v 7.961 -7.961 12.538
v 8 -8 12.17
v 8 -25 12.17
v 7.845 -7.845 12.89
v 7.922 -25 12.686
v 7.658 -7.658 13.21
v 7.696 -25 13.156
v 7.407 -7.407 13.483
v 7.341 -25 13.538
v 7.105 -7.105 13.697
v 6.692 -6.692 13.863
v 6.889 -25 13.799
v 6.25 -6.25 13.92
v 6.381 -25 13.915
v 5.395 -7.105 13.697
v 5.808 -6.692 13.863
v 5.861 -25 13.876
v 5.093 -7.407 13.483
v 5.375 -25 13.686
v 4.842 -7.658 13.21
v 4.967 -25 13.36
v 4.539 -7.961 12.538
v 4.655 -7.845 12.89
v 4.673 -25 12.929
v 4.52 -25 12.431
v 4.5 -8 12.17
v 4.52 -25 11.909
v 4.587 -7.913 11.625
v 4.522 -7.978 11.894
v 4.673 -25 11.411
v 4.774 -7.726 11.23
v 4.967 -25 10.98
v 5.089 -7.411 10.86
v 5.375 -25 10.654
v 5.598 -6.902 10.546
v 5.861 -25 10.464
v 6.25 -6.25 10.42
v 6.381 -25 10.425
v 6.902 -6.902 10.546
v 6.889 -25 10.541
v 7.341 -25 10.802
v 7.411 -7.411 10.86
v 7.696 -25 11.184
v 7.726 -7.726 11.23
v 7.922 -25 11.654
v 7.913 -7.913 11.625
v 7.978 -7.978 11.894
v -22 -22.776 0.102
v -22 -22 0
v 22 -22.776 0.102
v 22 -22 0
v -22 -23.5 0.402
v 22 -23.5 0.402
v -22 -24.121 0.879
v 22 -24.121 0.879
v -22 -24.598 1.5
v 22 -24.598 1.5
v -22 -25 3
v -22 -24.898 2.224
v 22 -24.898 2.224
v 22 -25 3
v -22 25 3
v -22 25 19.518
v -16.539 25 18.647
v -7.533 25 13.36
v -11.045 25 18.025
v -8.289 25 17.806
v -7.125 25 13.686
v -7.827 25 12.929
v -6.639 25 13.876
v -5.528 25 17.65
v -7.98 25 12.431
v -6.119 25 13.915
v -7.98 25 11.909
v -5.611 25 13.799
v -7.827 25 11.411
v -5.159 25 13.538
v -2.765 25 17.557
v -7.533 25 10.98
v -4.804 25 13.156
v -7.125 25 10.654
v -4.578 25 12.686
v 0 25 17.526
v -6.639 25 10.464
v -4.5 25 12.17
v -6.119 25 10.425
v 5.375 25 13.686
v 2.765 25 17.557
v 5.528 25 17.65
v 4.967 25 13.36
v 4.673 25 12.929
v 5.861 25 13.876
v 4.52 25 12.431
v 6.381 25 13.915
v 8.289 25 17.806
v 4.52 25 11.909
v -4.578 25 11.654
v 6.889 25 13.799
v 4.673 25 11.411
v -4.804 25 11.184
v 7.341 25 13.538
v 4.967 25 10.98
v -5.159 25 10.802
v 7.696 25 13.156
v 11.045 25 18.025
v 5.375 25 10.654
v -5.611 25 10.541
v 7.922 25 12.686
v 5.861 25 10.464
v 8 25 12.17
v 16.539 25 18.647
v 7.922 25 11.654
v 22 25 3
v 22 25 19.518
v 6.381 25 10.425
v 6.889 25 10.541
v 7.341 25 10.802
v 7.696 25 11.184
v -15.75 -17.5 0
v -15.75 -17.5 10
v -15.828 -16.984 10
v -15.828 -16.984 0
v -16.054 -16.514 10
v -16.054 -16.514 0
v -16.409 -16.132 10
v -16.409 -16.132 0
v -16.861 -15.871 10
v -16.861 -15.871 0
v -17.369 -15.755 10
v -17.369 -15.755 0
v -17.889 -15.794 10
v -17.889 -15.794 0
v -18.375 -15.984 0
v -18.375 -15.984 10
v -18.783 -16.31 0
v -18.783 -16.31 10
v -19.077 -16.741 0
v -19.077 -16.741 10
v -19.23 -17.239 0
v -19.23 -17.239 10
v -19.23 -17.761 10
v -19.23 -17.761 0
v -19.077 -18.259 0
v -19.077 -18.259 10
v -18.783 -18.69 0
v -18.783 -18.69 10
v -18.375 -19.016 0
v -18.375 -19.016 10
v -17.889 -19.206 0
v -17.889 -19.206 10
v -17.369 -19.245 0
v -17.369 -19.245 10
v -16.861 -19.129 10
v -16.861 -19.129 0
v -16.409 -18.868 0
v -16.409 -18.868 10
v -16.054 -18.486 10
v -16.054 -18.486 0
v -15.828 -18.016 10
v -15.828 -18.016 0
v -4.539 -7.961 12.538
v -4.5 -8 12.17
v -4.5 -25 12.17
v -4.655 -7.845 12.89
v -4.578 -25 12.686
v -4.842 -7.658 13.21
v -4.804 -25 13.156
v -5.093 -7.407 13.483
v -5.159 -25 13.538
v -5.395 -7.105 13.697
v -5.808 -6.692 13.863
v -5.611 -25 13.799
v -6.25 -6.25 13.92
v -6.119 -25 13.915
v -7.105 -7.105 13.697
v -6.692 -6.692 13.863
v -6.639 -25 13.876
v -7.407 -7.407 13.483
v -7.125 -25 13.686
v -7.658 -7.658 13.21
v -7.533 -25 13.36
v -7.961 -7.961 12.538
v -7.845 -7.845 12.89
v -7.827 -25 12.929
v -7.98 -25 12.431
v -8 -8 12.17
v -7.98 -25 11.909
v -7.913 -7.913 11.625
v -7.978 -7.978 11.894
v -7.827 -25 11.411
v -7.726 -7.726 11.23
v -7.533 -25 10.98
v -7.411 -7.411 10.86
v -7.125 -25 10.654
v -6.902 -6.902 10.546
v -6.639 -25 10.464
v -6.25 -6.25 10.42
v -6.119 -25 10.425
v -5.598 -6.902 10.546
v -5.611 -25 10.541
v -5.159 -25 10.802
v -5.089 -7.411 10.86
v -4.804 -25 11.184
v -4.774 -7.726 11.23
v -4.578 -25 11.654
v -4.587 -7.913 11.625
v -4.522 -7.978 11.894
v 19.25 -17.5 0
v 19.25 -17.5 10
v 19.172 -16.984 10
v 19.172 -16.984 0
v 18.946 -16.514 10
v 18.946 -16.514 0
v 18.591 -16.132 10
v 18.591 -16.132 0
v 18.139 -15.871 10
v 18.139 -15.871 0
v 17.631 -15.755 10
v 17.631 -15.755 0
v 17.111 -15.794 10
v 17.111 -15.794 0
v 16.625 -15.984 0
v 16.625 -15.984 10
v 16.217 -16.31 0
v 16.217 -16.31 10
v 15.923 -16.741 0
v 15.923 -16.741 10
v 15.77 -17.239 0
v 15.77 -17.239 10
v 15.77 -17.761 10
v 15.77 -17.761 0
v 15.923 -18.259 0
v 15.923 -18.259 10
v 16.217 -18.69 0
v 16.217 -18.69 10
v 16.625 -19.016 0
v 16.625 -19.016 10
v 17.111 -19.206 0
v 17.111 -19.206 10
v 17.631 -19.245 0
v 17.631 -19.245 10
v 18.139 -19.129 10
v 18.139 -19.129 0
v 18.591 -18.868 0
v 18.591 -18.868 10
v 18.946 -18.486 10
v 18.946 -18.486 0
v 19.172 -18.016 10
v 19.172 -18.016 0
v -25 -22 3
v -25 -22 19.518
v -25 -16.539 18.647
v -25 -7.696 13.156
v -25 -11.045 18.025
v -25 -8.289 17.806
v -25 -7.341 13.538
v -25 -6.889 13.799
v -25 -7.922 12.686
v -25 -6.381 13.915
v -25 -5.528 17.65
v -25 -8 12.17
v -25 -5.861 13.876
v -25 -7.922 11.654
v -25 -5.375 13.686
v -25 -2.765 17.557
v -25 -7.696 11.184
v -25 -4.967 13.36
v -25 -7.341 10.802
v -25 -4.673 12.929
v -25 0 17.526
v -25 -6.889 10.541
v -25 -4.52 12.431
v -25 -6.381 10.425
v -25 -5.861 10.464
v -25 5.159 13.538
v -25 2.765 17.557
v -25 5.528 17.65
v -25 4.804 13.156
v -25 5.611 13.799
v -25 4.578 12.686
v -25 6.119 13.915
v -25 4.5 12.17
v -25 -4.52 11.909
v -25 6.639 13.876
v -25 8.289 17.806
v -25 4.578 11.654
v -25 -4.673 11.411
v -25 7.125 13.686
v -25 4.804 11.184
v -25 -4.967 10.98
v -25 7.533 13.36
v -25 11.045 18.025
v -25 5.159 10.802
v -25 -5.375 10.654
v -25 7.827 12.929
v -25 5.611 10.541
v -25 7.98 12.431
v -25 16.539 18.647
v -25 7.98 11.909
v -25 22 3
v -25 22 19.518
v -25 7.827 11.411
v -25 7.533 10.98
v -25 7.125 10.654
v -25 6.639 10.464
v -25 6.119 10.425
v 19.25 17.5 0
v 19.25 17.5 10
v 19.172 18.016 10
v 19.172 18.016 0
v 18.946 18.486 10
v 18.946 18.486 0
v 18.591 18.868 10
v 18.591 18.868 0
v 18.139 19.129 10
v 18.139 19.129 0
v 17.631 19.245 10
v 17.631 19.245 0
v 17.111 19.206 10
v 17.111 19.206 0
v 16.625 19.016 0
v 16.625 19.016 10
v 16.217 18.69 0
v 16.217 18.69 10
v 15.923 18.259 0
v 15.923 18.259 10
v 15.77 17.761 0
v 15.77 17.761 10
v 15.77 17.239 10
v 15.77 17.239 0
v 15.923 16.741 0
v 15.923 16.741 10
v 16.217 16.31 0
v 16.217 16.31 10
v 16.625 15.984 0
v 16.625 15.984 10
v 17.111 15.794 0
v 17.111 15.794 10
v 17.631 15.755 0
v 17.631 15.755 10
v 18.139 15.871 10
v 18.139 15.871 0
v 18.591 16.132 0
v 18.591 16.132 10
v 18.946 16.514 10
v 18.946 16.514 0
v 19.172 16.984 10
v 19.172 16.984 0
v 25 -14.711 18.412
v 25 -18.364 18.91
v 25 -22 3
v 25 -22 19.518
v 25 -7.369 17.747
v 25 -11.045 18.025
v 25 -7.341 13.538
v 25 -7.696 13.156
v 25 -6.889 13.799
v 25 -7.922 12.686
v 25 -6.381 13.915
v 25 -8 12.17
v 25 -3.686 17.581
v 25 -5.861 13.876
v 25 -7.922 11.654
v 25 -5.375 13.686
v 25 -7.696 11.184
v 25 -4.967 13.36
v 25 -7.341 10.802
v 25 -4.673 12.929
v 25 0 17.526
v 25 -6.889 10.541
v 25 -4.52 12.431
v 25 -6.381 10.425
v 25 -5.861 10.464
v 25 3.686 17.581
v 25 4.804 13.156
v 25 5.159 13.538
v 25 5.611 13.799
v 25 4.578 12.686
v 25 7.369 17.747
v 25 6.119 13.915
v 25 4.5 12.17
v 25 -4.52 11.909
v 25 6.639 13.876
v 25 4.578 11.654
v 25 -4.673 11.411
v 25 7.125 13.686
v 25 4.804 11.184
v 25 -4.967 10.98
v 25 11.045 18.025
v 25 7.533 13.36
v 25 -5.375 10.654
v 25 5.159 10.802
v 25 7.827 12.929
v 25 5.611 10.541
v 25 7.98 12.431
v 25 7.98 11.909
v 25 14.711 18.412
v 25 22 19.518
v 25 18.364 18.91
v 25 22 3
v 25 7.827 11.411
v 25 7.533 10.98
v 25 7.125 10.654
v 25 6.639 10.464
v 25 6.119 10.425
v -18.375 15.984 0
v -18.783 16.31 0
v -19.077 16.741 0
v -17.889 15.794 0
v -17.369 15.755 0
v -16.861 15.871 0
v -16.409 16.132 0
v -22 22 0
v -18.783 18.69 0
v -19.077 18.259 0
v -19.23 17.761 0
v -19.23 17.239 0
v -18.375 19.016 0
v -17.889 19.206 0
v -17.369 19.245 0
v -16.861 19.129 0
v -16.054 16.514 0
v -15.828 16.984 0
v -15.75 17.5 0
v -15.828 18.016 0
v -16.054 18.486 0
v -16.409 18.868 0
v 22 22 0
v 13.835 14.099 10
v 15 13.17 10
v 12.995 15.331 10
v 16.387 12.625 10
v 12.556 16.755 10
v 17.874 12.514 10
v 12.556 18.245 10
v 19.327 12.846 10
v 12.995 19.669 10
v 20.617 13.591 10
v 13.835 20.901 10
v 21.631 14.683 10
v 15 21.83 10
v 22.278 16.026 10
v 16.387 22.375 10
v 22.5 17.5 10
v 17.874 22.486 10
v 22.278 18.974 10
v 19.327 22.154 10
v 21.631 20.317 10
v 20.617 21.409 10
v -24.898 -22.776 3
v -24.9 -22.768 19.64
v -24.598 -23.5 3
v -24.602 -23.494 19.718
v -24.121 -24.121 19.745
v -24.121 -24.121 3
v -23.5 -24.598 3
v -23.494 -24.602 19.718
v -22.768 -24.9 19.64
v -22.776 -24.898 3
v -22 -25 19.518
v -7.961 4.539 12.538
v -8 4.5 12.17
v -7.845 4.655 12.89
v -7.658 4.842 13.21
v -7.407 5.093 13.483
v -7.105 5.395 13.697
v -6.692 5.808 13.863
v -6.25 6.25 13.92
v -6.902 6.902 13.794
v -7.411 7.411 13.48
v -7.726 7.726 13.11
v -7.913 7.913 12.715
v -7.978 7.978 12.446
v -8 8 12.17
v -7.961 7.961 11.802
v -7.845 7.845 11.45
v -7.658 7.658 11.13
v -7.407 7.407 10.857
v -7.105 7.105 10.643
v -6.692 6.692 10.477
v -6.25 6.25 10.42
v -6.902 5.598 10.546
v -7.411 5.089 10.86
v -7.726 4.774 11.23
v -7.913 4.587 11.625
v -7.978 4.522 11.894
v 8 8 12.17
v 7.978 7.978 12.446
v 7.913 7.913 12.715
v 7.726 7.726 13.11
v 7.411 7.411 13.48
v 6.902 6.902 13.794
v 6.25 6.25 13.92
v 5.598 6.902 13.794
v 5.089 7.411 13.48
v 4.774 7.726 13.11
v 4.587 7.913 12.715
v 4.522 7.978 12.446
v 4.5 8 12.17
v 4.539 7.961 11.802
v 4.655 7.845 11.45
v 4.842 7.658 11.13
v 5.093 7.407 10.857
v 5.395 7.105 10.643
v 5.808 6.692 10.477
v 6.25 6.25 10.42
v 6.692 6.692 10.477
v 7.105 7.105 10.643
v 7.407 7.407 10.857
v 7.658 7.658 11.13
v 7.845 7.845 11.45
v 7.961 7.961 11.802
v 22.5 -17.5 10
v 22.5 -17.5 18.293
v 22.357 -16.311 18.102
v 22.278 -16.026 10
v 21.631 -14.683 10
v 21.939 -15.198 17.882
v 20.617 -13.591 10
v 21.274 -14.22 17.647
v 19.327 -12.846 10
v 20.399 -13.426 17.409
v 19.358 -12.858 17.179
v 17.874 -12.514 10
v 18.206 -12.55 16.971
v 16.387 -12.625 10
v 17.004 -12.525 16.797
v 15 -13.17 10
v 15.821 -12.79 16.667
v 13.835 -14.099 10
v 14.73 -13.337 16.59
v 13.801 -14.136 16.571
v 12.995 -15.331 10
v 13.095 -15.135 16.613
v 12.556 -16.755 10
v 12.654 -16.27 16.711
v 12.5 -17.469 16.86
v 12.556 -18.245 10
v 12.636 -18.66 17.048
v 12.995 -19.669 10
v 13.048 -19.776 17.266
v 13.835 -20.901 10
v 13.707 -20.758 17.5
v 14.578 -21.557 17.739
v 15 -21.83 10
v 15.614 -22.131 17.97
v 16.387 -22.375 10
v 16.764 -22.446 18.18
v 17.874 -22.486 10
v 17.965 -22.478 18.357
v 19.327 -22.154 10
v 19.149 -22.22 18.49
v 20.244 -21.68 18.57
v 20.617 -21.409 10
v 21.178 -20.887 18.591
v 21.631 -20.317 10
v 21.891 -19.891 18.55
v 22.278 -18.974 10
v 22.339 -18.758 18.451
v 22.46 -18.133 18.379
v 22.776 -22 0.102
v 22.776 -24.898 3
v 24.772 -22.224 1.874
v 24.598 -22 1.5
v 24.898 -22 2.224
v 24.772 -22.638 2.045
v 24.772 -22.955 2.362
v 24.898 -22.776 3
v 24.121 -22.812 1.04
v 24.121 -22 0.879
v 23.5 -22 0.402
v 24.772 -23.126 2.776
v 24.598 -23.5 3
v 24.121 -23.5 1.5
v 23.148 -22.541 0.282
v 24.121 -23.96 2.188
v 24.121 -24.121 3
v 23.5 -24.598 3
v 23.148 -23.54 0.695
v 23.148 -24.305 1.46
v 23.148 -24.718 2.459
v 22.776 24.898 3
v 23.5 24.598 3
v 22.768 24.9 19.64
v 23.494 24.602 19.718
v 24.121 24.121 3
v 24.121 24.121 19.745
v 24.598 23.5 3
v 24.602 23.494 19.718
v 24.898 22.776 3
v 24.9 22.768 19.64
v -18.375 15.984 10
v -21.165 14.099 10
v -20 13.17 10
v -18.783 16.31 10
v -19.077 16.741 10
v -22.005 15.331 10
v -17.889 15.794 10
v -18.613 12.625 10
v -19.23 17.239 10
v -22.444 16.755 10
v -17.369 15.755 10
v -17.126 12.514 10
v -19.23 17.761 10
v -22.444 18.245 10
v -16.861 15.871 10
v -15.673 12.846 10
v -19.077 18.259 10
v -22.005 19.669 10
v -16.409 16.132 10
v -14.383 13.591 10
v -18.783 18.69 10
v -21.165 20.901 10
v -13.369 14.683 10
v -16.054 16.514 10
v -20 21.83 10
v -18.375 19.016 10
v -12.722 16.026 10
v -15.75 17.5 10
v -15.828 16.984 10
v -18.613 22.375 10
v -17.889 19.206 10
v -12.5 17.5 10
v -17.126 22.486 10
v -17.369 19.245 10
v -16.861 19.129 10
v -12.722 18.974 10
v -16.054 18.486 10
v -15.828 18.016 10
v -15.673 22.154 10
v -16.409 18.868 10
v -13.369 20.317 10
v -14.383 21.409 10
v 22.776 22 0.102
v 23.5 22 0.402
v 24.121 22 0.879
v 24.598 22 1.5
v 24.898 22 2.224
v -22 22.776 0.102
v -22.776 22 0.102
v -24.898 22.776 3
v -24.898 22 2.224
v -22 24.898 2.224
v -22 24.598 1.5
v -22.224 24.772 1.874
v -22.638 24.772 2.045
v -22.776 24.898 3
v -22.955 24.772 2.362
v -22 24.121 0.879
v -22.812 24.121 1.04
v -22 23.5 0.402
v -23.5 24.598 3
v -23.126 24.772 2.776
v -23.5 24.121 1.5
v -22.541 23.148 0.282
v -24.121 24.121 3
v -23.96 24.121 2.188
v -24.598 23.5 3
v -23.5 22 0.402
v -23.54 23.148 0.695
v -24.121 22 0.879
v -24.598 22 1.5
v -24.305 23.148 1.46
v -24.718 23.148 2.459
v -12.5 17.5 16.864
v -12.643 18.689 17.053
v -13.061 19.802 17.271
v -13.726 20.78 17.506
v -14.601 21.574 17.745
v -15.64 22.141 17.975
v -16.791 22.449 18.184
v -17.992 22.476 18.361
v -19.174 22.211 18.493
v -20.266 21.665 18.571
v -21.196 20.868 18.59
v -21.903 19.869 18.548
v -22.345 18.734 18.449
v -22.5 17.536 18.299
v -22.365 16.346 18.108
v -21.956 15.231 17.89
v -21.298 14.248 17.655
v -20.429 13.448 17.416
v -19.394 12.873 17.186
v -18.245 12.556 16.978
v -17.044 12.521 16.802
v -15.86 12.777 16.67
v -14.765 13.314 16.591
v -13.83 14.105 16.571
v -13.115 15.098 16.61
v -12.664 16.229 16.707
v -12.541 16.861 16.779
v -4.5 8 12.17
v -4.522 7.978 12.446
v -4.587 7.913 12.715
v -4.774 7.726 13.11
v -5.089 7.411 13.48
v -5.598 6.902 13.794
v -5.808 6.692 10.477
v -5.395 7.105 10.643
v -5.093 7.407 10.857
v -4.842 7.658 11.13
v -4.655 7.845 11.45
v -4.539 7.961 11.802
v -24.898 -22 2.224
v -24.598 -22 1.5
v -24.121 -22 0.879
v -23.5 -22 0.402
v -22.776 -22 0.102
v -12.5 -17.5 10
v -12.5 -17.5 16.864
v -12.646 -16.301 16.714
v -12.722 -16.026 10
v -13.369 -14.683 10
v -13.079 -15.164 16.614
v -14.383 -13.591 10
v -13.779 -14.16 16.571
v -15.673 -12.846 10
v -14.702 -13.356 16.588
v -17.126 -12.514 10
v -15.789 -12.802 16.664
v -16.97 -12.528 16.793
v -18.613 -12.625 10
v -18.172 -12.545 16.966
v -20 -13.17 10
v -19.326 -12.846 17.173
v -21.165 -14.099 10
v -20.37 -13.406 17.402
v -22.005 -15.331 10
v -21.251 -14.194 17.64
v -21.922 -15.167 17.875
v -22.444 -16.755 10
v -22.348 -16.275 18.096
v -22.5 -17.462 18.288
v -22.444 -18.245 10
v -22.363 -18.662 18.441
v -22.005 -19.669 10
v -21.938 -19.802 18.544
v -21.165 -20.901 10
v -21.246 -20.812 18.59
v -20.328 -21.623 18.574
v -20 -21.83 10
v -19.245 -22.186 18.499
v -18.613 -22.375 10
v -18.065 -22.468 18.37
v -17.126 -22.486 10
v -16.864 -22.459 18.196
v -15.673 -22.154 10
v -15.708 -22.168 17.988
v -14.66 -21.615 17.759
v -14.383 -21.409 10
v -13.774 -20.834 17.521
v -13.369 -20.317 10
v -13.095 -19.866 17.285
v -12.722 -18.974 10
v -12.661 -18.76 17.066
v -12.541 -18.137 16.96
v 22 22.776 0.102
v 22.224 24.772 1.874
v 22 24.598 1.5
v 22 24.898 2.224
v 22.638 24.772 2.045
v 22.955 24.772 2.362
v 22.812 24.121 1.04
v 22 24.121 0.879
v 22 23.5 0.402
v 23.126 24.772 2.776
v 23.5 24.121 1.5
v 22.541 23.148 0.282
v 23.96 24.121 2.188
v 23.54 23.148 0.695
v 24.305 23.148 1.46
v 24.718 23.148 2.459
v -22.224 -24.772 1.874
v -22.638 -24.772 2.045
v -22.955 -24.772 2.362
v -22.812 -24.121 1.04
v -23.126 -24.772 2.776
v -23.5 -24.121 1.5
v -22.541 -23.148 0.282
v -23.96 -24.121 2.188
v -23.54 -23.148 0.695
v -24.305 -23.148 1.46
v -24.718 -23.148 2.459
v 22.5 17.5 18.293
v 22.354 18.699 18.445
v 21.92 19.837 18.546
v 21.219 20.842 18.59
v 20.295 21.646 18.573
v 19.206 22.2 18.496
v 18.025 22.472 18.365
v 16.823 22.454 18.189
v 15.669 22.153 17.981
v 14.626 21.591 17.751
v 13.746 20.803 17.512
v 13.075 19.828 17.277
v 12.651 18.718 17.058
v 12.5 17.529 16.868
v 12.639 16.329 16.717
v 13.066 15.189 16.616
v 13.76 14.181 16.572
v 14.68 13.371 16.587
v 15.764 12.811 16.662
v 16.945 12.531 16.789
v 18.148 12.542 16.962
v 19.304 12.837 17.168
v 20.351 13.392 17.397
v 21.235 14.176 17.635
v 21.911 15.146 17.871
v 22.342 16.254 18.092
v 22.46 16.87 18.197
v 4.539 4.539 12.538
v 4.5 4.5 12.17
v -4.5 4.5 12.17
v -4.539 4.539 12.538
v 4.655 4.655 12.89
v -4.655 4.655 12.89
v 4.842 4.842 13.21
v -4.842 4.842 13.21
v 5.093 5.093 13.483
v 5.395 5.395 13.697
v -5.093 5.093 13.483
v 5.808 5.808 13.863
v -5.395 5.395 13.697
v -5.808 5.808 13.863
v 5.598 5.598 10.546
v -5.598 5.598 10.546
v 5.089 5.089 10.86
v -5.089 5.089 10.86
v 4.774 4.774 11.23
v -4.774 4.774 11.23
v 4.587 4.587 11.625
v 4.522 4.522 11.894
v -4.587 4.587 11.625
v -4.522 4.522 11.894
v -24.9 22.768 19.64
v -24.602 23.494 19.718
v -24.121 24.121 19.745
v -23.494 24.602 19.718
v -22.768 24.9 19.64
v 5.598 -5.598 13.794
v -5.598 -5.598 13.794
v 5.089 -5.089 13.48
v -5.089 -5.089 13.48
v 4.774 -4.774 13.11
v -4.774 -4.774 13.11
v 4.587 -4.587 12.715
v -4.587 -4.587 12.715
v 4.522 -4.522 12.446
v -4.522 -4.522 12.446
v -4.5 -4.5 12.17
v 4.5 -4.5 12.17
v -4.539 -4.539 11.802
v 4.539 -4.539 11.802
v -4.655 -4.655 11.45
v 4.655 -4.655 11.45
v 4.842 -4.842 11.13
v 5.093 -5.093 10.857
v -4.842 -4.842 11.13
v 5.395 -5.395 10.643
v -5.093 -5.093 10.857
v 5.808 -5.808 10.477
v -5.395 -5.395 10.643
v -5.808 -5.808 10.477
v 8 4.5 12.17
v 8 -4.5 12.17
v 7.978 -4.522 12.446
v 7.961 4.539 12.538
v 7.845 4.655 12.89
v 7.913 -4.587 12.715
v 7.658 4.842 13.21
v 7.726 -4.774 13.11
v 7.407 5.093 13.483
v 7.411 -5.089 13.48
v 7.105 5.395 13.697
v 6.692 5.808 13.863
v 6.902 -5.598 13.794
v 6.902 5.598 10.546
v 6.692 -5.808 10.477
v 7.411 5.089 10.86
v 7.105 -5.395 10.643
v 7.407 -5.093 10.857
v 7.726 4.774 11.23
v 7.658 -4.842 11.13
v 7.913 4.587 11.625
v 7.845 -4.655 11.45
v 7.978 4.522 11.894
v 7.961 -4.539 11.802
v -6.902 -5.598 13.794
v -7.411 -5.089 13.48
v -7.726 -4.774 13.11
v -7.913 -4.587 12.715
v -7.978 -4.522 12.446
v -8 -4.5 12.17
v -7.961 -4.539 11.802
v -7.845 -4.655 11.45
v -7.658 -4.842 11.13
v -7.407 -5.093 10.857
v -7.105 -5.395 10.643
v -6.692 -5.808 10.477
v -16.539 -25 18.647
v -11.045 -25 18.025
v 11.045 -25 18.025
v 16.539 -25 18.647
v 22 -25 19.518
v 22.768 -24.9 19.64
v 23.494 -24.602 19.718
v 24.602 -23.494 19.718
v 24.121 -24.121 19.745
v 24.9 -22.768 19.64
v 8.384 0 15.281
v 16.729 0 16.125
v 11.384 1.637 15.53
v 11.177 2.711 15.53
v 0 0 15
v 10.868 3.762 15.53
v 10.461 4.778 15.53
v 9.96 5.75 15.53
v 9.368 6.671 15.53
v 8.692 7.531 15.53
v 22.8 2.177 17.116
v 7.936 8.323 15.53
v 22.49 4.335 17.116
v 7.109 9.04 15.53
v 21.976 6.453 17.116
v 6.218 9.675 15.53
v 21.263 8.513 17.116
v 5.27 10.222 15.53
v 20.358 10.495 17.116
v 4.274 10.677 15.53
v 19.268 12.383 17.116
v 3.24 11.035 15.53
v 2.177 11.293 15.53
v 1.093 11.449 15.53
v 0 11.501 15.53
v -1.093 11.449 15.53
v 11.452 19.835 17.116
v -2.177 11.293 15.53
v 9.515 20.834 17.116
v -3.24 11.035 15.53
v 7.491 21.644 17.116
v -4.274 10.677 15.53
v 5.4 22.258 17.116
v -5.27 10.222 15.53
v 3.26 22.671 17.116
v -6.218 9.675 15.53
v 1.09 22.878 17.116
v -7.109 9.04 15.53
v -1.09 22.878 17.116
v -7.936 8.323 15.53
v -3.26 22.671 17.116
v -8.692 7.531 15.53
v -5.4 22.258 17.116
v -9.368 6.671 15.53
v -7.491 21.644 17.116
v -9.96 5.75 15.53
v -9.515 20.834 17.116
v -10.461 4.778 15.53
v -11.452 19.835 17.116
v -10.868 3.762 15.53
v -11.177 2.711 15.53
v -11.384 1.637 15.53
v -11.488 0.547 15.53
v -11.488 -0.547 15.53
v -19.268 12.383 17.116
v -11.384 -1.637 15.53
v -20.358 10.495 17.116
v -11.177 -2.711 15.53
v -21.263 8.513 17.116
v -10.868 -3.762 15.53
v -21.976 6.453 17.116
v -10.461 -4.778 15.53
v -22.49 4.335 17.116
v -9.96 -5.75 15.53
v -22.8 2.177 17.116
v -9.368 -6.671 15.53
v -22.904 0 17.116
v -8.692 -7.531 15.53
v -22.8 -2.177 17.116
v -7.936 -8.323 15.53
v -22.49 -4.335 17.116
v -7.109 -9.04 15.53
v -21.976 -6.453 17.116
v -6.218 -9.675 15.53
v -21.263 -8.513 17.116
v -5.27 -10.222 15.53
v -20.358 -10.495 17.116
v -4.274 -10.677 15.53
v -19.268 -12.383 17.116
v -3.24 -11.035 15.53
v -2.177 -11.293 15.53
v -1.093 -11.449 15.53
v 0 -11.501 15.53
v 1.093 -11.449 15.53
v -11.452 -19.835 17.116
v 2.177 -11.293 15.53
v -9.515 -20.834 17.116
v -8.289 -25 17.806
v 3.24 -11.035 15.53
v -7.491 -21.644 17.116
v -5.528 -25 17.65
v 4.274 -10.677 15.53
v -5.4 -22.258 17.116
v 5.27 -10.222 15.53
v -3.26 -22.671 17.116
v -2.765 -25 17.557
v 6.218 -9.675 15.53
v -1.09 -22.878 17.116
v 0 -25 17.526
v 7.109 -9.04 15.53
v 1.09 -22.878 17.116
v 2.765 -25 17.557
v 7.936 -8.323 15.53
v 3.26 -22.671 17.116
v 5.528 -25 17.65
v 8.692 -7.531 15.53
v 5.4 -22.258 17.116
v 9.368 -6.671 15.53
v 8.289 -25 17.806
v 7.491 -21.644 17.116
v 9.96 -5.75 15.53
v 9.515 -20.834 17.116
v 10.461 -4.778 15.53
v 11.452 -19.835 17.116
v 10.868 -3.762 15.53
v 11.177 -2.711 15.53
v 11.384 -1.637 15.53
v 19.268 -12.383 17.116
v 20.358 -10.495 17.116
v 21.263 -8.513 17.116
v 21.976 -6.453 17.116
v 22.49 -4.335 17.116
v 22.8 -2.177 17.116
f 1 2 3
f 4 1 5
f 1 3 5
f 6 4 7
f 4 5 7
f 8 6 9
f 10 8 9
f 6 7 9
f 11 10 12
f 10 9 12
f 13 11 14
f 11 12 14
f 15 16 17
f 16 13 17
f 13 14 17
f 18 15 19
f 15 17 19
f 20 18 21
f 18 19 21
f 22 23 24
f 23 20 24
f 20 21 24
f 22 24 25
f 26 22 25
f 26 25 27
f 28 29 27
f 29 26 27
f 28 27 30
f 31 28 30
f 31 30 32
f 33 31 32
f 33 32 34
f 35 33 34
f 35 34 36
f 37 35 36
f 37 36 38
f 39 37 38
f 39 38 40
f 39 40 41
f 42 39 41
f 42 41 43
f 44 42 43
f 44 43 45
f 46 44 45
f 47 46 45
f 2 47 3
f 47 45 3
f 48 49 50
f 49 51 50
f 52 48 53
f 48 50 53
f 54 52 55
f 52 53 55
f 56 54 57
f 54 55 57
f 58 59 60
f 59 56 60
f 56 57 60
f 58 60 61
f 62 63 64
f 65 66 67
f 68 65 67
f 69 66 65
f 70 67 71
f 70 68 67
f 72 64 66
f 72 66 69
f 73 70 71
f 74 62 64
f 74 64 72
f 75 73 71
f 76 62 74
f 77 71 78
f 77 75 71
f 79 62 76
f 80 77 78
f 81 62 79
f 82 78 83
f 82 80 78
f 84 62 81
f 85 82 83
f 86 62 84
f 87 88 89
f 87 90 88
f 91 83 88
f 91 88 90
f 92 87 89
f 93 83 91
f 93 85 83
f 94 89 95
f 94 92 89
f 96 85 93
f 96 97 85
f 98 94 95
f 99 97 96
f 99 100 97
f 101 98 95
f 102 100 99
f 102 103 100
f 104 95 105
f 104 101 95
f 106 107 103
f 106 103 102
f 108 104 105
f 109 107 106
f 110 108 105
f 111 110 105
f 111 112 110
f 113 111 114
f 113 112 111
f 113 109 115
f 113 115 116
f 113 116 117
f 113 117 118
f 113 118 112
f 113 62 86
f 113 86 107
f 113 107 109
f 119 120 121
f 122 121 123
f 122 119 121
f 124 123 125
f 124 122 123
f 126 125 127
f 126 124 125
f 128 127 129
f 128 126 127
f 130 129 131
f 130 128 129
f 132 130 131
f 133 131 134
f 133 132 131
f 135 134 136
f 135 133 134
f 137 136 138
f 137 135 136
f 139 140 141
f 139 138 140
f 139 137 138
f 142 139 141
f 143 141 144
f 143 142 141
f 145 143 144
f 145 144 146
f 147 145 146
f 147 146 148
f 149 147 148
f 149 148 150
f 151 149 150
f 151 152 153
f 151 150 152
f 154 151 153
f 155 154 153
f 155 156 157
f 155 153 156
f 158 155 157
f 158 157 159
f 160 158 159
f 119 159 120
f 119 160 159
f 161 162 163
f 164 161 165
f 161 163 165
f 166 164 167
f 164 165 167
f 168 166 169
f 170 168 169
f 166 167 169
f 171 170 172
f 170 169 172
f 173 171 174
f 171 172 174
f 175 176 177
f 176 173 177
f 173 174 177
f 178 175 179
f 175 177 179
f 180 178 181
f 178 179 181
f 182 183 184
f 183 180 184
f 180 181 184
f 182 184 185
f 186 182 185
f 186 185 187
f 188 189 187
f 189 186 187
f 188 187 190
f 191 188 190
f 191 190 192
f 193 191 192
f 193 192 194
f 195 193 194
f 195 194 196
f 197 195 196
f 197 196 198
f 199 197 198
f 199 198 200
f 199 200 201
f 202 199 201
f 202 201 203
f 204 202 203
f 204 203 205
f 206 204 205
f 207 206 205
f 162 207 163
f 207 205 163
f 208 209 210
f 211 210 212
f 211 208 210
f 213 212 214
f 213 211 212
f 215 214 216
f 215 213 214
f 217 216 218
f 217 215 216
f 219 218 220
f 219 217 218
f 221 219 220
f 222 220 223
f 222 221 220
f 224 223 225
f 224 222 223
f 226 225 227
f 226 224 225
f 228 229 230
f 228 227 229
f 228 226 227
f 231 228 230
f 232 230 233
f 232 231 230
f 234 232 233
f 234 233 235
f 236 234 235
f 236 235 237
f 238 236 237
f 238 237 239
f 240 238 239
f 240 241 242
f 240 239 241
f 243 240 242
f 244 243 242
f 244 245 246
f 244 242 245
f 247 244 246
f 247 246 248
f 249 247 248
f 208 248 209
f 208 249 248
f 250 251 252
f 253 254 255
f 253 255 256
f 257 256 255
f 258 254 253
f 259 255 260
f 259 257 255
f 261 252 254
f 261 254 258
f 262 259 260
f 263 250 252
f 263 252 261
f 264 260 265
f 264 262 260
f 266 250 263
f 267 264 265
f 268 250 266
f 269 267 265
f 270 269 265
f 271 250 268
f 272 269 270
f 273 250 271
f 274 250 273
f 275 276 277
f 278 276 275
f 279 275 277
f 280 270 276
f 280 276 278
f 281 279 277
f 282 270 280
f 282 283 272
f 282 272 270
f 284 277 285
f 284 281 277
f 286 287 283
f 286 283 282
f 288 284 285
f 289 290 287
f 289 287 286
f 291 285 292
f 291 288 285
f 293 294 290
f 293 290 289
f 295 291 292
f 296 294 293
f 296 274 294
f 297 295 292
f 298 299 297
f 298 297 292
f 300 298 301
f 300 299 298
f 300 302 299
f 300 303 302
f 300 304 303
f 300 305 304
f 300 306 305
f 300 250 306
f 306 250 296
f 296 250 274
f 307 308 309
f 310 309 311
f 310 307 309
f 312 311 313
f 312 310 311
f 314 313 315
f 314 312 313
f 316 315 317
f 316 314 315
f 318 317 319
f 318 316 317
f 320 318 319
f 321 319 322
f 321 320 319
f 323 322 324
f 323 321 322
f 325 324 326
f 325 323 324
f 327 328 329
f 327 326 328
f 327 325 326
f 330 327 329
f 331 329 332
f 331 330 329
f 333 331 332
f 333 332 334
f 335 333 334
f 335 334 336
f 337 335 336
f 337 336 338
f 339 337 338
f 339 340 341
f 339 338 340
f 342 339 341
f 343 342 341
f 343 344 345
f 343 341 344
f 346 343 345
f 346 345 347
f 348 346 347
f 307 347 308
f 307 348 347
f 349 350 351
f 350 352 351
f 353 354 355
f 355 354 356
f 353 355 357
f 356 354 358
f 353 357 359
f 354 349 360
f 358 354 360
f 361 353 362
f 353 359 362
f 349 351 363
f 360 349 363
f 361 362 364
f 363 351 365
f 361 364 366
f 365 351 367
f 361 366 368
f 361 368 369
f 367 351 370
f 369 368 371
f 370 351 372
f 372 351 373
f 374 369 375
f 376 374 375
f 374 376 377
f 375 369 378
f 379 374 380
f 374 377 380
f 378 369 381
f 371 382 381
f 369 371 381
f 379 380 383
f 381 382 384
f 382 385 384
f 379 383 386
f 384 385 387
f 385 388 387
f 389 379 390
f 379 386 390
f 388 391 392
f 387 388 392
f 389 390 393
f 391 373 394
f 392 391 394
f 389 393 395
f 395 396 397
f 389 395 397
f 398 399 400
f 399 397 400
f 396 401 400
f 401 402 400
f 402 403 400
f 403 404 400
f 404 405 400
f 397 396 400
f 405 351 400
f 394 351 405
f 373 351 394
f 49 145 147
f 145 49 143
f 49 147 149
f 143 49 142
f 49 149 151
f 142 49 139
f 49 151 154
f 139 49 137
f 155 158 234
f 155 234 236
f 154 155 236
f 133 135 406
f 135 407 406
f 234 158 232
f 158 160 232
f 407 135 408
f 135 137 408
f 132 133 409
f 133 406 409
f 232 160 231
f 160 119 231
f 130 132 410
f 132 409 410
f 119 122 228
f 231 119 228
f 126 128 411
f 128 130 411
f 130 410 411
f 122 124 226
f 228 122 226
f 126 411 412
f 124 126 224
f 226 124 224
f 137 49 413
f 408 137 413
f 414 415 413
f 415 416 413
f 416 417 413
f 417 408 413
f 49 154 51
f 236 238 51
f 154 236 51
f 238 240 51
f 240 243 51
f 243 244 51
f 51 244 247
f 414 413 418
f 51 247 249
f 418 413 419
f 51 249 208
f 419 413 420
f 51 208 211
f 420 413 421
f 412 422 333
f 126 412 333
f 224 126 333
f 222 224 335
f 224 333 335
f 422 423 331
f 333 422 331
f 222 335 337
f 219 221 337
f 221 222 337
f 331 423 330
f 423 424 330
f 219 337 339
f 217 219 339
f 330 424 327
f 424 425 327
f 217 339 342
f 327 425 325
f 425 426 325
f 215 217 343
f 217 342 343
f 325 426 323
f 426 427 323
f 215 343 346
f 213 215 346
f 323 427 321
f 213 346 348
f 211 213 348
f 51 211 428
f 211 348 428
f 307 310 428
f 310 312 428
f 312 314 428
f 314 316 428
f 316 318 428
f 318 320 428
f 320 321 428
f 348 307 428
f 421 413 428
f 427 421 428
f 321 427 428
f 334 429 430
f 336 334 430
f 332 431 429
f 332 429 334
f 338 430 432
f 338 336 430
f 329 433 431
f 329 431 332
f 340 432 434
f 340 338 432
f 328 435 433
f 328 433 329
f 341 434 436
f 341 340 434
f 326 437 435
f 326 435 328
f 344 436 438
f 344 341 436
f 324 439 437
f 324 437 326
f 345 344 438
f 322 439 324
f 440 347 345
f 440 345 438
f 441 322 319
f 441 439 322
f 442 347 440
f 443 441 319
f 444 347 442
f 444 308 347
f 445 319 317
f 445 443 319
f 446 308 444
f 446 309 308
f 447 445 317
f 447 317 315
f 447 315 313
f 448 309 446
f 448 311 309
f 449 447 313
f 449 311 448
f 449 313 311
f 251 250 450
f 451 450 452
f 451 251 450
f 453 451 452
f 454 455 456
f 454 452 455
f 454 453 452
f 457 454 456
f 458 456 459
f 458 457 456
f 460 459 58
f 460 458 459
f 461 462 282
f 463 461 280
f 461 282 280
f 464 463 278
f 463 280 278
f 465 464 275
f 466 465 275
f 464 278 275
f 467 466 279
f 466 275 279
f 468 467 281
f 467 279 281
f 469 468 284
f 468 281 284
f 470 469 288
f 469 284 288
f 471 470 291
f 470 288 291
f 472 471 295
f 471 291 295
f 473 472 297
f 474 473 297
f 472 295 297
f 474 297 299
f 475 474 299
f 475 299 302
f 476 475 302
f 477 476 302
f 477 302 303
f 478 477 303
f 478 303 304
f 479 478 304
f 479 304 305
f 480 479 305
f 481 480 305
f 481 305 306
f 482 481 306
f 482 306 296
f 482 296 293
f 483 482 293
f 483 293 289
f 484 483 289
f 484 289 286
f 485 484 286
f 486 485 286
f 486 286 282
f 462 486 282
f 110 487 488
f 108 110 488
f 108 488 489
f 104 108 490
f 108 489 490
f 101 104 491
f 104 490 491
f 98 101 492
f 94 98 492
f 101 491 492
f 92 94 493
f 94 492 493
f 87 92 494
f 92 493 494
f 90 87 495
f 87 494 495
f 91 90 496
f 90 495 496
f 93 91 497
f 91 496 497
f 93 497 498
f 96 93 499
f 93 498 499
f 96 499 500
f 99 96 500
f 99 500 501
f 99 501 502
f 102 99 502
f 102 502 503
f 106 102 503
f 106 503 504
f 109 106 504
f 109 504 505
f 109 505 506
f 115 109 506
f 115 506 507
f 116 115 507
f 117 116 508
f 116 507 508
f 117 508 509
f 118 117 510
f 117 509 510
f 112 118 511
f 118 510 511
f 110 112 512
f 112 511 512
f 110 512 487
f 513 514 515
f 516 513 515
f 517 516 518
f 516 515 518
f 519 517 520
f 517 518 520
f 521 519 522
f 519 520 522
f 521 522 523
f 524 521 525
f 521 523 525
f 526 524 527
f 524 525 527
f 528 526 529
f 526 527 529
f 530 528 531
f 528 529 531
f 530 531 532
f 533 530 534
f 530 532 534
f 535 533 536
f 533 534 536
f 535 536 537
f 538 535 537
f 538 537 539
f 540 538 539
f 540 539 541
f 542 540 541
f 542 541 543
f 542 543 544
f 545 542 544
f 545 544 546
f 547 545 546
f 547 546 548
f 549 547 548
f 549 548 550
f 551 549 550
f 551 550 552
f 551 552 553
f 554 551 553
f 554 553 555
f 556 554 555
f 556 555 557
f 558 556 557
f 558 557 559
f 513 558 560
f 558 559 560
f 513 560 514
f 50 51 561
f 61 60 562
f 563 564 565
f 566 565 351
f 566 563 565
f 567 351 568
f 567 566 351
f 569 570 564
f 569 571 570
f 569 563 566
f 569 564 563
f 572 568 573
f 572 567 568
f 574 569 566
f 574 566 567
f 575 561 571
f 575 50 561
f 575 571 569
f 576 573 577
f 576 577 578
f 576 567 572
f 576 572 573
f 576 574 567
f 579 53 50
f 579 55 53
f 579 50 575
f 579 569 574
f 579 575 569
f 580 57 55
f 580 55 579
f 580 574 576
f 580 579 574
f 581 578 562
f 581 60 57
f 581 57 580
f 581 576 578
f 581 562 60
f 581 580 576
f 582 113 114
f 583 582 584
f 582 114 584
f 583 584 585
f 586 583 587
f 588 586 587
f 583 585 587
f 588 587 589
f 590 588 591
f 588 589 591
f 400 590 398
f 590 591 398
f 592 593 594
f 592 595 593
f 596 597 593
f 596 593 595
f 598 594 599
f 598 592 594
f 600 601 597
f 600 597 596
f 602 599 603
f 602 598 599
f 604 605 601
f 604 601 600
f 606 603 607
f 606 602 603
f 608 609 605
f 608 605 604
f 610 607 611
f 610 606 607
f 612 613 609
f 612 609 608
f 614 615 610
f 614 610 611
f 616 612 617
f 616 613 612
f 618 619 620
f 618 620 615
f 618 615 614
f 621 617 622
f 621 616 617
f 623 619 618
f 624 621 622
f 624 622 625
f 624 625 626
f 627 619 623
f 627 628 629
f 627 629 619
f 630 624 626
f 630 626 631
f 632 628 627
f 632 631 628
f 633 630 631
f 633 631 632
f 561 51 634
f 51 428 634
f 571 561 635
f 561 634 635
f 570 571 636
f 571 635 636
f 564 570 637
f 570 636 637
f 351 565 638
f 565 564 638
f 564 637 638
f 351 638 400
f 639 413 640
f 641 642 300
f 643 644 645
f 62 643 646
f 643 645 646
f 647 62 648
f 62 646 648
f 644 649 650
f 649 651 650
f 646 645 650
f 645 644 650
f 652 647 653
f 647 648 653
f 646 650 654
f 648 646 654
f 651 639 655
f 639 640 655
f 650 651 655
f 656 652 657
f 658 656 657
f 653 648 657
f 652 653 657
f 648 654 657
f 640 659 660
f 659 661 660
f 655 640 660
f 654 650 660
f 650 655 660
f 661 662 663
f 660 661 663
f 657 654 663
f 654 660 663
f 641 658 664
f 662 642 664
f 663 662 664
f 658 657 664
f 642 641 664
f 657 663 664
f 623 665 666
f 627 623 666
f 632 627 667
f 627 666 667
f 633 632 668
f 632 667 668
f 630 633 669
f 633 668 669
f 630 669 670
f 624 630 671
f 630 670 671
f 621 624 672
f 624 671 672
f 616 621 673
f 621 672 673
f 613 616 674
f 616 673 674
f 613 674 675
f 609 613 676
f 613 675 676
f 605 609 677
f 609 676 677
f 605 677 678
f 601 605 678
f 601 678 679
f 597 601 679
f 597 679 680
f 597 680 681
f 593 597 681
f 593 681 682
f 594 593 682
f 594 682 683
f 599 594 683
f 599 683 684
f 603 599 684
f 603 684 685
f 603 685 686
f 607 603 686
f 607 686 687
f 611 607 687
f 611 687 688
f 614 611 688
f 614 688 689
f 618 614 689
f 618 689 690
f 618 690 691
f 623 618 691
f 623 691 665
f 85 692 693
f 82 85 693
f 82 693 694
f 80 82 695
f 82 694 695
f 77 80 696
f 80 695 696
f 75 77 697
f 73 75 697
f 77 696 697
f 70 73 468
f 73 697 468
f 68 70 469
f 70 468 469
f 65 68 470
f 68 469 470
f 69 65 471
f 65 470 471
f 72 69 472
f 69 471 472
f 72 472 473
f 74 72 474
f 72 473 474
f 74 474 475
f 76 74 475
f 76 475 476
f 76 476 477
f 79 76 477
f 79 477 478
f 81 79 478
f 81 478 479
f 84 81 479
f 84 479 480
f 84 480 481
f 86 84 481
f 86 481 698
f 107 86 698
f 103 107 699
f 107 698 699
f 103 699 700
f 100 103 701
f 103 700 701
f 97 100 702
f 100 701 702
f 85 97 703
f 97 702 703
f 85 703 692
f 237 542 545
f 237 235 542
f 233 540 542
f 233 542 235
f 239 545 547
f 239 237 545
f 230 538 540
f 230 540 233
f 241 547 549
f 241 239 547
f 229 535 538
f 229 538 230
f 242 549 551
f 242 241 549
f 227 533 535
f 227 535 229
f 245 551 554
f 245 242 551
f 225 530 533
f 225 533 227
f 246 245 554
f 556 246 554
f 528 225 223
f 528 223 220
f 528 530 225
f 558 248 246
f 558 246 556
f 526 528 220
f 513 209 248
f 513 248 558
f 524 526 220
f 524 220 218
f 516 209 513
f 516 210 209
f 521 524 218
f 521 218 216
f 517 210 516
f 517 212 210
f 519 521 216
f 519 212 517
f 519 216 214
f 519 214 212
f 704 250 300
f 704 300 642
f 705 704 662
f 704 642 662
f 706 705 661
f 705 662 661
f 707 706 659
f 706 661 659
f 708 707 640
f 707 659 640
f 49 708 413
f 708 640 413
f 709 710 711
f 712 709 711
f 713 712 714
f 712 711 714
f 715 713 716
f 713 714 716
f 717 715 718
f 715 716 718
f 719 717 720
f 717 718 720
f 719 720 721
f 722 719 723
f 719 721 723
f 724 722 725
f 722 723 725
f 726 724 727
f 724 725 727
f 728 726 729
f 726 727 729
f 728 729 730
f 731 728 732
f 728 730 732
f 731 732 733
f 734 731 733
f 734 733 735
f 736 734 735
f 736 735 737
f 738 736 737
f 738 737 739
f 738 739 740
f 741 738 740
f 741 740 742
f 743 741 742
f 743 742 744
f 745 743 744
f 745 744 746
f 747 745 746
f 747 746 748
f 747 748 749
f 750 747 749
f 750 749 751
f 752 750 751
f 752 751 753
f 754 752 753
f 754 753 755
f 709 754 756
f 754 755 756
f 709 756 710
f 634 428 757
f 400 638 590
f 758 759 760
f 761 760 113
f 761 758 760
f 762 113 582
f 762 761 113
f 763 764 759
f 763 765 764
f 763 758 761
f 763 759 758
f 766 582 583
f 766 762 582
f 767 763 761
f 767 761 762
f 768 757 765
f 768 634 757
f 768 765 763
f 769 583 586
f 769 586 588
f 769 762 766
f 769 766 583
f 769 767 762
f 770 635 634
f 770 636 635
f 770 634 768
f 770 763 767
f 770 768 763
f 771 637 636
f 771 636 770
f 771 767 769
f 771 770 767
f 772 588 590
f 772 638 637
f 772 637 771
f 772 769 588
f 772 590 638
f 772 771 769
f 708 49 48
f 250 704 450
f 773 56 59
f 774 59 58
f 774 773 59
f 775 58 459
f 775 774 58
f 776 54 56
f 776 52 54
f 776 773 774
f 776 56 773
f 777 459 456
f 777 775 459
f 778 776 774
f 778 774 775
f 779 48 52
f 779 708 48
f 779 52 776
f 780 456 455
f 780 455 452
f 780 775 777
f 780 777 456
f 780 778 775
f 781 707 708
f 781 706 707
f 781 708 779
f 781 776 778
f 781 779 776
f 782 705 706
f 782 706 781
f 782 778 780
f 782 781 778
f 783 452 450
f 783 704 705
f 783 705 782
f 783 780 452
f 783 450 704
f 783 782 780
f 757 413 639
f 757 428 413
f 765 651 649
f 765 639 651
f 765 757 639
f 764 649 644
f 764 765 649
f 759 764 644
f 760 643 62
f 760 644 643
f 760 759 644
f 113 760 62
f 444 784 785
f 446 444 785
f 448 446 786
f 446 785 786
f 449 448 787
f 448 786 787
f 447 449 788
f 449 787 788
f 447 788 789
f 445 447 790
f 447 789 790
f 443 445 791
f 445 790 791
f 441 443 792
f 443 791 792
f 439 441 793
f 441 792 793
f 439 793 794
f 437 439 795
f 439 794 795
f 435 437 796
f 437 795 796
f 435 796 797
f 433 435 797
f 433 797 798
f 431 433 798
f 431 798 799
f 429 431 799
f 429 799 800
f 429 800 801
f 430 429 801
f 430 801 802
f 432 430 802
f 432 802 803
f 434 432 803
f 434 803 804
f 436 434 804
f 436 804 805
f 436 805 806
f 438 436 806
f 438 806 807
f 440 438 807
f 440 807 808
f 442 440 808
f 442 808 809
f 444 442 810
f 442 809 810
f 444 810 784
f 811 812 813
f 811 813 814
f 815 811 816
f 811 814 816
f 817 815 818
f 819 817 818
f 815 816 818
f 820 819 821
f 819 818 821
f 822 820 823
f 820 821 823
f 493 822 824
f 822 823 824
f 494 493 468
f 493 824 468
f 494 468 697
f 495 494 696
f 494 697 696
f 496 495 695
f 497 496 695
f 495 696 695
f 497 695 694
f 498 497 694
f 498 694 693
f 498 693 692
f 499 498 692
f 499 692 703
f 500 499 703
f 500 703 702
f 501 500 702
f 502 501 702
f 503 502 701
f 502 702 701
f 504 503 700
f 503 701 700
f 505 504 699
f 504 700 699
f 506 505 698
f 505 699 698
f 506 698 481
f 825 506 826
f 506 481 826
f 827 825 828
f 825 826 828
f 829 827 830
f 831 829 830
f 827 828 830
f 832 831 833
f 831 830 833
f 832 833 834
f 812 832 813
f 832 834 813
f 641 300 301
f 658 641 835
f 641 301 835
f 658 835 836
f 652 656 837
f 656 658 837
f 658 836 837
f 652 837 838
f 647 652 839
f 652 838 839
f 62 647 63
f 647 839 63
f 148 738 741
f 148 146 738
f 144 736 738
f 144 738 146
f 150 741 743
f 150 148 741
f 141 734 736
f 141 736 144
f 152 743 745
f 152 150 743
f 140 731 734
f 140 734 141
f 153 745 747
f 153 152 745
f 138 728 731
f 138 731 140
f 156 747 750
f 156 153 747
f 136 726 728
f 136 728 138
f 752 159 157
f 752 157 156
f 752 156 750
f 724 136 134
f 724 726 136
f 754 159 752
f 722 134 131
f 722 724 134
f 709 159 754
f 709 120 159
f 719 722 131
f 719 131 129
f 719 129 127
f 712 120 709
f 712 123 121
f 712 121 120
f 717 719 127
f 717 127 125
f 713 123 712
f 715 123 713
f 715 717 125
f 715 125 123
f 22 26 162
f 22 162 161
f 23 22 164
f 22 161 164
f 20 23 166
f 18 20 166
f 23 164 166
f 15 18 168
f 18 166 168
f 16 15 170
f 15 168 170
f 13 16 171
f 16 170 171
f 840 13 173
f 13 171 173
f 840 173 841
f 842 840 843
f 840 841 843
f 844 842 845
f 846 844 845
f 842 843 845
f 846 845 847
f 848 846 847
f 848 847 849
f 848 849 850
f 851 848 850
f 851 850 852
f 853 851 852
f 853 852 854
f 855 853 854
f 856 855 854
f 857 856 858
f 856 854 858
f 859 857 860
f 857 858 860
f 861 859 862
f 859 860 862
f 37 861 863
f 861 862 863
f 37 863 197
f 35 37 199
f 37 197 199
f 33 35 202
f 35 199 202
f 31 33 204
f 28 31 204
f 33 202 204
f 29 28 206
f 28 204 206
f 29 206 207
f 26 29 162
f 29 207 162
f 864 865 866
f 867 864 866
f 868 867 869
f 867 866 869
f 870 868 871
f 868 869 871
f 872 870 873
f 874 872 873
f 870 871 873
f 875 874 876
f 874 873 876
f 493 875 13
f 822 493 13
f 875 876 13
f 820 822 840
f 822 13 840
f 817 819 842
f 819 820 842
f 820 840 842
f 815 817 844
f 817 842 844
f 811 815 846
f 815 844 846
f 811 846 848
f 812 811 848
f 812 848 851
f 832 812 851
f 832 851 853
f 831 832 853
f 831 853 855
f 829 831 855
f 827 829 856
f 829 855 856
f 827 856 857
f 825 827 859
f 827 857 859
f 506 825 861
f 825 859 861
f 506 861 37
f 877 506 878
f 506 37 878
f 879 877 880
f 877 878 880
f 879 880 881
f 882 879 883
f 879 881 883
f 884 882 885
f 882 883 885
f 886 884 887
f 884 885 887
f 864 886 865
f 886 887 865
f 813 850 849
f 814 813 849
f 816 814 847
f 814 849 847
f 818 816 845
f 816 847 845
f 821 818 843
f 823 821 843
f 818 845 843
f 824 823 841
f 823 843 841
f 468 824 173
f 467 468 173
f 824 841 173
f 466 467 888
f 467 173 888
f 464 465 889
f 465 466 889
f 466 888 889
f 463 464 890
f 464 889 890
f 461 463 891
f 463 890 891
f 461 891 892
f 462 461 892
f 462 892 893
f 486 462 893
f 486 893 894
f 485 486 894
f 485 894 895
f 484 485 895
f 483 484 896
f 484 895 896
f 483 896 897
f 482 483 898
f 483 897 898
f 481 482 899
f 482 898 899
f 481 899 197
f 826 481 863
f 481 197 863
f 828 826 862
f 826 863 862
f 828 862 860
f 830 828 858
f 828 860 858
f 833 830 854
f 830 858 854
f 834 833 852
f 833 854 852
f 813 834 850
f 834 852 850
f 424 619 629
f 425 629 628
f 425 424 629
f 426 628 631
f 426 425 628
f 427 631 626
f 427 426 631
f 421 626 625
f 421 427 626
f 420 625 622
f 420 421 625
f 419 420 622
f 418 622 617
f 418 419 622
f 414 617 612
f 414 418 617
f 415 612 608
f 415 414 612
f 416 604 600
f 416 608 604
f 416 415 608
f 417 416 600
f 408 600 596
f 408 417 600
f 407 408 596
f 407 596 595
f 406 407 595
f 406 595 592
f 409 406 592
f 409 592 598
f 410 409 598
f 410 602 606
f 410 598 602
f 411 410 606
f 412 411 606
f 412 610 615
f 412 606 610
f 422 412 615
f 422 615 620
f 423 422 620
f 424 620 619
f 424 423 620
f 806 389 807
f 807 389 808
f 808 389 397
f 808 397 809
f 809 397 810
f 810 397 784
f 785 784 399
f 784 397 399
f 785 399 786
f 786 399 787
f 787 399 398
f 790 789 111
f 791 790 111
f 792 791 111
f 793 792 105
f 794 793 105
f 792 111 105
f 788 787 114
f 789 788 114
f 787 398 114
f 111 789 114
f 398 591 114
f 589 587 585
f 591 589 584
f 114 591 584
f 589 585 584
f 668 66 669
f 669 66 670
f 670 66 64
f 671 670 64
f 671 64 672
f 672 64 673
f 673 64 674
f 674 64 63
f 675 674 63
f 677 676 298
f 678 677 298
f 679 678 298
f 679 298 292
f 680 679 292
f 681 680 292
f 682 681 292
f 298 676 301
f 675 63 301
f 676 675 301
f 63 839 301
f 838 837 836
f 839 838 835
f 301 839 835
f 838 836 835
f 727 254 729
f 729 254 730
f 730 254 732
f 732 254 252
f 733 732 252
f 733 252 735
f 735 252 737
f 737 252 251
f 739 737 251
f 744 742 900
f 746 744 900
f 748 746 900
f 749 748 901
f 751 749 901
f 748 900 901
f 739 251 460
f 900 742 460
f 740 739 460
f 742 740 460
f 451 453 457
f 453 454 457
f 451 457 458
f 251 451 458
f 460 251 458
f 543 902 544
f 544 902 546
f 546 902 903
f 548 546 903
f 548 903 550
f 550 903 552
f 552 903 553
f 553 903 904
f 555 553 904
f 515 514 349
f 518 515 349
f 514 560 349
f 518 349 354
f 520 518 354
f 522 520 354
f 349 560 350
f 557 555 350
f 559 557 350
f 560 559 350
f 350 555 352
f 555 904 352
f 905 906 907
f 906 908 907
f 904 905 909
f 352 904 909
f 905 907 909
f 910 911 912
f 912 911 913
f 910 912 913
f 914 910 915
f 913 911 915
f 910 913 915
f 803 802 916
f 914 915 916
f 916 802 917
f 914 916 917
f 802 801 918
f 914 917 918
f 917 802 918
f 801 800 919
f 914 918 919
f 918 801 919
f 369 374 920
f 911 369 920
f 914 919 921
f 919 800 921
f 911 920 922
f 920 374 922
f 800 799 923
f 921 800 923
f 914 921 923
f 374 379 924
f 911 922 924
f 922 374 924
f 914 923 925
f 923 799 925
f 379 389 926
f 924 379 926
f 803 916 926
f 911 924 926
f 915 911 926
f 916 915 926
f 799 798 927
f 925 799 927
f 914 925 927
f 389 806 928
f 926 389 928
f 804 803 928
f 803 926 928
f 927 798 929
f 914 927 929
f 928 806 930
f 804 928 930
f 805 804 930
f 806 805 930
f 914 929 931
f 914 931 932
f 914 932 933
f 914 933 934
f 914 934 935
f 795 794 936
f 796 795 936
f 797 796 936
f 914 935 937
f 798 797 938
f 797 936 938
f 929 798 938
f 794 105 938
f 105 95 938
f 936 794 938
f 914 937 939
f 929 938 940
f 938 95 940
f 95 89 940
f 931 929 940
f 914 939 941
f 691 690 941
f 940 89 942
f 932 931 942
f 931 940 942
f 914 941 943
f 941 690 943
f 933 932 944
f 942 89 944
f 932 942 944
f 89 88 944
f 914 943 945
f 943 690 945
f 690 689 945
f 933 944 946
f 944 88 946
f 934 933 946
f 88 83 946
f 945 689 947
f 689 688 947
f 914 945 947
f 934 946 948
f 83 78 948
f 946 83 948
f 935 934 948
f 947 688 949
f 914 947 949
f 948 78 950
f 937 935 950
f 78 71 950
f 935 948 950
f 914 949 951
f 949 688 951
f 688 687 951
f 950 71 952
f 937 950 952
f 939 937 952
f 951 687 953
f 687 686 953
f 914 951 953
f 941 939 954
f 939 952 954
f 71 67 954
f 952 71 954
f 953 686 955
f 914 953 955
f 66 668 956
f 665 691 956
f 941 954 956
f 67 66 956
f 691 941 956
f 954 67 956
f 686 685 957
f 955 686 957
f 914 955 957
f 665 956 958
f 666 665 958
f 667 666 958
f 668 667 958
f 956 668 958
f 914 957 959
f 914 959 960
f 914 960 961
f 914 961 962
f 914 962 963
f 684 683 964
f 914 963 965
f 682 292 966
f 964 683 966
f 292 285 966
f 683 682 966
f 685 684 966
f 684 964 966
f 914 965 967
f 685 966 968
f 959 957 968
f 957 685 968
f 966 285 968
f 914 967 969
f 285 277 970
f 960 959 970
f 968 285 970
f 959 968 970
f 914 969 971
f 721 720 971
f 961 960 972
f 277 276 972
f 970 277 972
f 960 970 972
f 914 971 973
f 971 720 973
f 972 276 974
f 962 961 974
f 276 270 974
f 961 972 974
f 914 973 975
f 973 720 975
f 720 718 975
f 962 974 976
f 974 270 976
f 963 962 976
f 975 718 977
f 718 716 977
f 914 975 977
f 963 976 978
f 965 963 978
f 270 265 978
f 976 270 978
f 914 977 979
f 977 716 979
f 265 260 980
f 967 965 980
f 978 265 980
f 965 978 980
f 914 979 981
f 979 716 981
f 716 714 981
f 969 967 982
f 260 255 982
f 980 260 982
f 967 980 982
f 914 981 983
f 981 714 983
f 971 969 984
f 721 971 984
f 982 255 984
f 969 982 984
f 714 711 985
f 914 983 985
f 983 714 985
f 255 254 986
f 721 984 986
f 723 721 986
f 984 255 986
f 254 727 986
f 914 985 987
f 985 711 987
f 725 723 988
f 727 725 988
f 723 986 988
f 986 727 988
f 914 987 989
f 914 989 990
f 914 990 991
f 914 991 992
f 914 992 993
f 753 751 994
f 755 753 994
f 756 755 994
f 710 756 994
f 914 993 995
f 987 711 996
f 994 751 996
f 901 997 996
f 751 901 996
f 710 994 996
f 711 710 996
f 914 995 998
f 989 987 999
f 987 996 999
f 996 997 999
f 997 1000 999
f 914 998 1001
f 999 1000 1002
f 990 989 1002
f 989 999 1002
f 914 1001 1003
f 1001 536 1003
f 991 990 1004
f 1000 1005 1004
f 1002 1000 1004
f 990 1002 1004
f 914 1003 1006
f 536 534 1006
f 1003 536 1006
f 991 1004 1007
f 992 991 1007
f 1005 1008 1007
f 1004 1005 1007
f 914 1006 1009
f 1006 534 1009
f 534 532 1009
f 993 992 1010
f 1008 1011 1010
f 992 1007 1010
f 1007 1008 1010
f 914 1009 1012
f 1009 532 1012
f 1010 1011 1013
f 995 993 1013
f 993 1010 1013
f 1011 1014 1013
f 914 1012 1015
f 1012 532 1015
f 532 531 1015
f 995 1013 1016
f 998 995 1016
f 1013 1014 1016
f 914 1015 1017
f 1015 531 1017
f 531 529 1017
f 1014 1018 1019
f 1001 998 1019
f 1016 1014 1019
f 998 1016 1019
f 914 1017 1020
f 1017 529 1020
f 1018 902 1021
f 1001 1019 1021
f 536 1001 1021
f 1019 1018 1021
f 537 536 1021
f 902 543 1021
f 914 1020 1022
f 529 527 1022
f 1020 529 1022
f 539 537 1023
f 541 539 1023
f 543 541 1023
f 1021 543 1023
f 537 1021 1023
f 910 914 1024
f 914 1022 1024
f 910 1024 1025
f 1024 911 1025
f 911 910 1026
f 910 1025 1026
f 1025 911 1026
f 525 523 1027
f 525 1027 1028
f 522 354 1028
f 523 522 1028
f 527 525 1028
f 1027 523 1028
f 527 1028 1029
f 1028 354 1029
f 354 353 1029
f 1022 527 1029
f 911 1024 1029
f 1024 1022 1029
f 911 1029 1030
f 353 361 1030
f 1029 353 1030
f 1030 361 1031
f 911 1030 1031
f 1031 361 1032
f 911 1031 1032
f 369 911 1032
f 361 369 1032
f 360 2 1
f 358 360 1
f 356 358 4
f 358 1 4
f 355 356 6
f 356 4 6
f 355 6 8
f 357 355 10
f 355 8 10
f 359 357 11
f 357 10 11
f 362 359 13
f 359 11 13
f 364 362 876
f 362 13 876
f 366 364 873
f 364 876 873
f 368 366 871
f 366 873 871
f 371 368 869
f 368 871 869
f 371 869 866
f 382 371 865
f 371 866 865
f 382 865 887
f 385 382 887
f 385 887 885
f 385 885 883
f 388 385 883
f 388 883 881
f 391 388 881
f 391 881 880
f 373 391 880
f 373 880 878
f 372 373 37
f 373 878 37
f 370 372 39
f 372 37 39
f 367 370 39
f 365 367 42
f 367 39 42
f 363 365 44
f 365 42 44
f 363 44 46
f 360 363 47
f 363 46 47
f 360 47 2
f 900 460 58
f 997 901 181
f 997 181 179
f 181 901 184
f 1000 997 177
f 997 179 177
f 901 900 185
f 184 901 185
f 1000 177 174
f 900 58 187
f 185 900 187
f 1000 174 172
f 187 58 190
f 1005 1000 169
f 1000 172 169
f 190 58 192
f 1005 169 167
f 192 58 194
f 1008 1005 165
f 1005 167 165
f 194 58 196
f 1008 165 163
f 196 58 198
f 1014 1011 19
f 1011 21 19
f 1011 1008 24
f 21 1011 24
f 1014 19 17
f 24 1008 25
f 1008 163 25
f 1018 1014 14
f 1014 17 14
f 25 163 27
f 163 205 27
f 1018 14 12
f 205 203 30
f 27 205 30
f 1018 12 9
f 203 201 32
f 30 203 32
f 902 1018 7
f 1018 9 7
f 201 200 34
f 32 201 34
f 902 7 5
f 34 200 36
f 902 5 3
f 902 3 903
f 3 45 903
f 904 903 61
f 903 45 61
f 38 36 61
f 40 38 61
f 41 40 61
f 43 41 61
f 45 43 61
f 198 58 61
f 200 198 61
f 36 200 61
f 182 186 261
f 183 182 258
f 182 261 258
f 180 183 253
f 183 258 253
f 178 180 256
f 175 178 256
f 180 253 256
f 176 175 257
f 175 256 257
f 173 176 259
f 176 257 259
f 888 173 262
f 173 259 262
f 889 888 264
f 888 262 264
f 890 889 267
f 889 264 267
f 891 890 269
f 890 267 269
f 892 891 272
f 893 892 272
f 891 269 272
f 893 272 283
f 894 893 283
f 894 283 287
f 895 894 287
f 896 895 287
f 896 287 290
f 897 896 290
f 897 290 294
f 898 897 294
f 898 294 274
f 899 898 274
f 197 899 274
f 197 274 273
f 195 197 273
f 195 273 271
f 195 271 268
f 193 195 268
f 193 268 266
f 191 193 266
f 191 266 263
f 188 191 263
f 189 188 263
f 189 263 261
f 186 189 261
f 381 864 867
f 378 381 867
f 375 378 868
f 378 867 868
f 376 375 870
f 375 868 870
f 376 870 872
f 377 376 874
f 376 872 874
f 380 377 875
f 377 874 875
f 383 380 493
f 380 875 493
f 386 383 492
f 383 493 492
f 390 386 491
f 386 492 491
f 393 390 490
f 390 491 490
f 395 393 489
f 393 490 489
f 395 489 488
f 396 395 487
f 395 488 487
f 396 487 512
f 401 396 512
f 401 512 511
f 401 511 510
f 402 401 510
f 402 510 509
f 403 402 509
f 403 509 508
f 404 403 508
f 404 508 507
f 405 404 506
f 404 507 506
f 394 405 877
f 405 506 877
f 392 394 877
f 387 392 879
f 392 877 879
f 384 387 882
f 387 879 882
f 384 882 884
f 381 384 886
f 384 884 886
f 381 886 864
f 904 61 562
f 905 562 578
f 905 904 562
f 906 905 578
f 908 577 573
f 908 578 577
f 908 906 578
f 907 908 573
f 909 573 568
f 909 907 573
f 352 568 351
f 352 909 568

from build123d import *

# Parameters (mm, degrees)
F0_W      = 50
F0_H      = 50
F1_DEPTH  = 30
F4_R      = 1.75
F5_DEPTH  = 50.001
F6_R      = 1.75
F7_DEPTH  = 50.001
F8_R      = 1.75
F9_DEPTH  = 20.105212
F11_R     = 5
F12_DEPTH = 20
F13_R     = 3


with BuildPart() as f1:
    # F0 (on Top) → F1 (new body)
    with BuildSketch(Plane.XY):
        Rectangle(F0_W, F0_H)
    extrude(amount=F1_DEPTH)

    # F2 (on Front) → F3 (revolve, cut)
    with BuildSketch(Plane.XZ):
        with BuildLine():
            Line((0, 265), (0, 15))
            ThreePointArc((0, 15), (125, 140), (0, 265))
        make_face()
    revolve(axis=Axis((0, 0, 140), (0, 0, 1)), mode=Mode.SUBTRACT)

    # F4 (on face) → F5 (cut, through all)
    with BuildSketch(Plane(origin=(-25, 0, 0), x_dir=(0, -1, 0), z_dir=(-1, 0, 0))):
        with Locations((-6.25, 12.17)):
            Circle(F4_R)
        with Locations((6.25, 12.17)):
            Circle(F4_R)
    extrude(amount=-F5_DEPTH, mode=Mode.SUBTRACT)

    # F6 (on face) → F7 (cut, through all)
    with BuildSketch(Plane.XZ.offset(25)):
        with Locations((-6.25, 12.17)):
            Circle(F6_R)
        with Locations((6.25, 12.17)):
            Circle(F6_R)
    extrude(amount=-F7_DEPTH, mode=Mode.SUBTRACT)

    # F8 (on Top) → F9 (cut, through all)
    with BuildSketch(Plane.XY):
        with Locations((17.5, 17.5)):
            Circle(F8_R)
        with Locations((17.5, -17.5)):
            Circle(F8_R)
        with Locations((-17.5, 17.5)):
            Circle(F8_R)
        with Locations((-17.5, -17.5)):
            Circle(F8_R)
    extrude(amount=F9_DEPTH, mode=Mode.SUBTRACT)

    # F11 (on offset) → F12 (cut)
    with BuildSketch(Plane.XY.offset(30)):
        with Locations((-17.5, 17.5)):
            Circle(F11_R)
        with Locations((-17.5, -17.5)):
            Circle(F11_R)
        with Locations((17.5, 17.5)):
            Circle(F11_R)
        with Locations((17.5, -17.5)):
            Circle(F11_R)
    extrude(amount=-F12_DEPTH, mode=Mode.SUBTRACT)

    # F13
    f13_edges = [f1.edges().sort_by_distance(p)[0] for p in [
        (-25, 0, 0),
        (0, -25, 0),
        (25, 0, 0),
        (0, 25, 0),
        (25, -25, 10.052106),
        (25, 25, 10.052106),
        (-25, 25, 10.052106),
        (-25, -25, 10.052106),
    ]]
    fillet(f13_edges, radius=F13_R)


solid = f1.part
